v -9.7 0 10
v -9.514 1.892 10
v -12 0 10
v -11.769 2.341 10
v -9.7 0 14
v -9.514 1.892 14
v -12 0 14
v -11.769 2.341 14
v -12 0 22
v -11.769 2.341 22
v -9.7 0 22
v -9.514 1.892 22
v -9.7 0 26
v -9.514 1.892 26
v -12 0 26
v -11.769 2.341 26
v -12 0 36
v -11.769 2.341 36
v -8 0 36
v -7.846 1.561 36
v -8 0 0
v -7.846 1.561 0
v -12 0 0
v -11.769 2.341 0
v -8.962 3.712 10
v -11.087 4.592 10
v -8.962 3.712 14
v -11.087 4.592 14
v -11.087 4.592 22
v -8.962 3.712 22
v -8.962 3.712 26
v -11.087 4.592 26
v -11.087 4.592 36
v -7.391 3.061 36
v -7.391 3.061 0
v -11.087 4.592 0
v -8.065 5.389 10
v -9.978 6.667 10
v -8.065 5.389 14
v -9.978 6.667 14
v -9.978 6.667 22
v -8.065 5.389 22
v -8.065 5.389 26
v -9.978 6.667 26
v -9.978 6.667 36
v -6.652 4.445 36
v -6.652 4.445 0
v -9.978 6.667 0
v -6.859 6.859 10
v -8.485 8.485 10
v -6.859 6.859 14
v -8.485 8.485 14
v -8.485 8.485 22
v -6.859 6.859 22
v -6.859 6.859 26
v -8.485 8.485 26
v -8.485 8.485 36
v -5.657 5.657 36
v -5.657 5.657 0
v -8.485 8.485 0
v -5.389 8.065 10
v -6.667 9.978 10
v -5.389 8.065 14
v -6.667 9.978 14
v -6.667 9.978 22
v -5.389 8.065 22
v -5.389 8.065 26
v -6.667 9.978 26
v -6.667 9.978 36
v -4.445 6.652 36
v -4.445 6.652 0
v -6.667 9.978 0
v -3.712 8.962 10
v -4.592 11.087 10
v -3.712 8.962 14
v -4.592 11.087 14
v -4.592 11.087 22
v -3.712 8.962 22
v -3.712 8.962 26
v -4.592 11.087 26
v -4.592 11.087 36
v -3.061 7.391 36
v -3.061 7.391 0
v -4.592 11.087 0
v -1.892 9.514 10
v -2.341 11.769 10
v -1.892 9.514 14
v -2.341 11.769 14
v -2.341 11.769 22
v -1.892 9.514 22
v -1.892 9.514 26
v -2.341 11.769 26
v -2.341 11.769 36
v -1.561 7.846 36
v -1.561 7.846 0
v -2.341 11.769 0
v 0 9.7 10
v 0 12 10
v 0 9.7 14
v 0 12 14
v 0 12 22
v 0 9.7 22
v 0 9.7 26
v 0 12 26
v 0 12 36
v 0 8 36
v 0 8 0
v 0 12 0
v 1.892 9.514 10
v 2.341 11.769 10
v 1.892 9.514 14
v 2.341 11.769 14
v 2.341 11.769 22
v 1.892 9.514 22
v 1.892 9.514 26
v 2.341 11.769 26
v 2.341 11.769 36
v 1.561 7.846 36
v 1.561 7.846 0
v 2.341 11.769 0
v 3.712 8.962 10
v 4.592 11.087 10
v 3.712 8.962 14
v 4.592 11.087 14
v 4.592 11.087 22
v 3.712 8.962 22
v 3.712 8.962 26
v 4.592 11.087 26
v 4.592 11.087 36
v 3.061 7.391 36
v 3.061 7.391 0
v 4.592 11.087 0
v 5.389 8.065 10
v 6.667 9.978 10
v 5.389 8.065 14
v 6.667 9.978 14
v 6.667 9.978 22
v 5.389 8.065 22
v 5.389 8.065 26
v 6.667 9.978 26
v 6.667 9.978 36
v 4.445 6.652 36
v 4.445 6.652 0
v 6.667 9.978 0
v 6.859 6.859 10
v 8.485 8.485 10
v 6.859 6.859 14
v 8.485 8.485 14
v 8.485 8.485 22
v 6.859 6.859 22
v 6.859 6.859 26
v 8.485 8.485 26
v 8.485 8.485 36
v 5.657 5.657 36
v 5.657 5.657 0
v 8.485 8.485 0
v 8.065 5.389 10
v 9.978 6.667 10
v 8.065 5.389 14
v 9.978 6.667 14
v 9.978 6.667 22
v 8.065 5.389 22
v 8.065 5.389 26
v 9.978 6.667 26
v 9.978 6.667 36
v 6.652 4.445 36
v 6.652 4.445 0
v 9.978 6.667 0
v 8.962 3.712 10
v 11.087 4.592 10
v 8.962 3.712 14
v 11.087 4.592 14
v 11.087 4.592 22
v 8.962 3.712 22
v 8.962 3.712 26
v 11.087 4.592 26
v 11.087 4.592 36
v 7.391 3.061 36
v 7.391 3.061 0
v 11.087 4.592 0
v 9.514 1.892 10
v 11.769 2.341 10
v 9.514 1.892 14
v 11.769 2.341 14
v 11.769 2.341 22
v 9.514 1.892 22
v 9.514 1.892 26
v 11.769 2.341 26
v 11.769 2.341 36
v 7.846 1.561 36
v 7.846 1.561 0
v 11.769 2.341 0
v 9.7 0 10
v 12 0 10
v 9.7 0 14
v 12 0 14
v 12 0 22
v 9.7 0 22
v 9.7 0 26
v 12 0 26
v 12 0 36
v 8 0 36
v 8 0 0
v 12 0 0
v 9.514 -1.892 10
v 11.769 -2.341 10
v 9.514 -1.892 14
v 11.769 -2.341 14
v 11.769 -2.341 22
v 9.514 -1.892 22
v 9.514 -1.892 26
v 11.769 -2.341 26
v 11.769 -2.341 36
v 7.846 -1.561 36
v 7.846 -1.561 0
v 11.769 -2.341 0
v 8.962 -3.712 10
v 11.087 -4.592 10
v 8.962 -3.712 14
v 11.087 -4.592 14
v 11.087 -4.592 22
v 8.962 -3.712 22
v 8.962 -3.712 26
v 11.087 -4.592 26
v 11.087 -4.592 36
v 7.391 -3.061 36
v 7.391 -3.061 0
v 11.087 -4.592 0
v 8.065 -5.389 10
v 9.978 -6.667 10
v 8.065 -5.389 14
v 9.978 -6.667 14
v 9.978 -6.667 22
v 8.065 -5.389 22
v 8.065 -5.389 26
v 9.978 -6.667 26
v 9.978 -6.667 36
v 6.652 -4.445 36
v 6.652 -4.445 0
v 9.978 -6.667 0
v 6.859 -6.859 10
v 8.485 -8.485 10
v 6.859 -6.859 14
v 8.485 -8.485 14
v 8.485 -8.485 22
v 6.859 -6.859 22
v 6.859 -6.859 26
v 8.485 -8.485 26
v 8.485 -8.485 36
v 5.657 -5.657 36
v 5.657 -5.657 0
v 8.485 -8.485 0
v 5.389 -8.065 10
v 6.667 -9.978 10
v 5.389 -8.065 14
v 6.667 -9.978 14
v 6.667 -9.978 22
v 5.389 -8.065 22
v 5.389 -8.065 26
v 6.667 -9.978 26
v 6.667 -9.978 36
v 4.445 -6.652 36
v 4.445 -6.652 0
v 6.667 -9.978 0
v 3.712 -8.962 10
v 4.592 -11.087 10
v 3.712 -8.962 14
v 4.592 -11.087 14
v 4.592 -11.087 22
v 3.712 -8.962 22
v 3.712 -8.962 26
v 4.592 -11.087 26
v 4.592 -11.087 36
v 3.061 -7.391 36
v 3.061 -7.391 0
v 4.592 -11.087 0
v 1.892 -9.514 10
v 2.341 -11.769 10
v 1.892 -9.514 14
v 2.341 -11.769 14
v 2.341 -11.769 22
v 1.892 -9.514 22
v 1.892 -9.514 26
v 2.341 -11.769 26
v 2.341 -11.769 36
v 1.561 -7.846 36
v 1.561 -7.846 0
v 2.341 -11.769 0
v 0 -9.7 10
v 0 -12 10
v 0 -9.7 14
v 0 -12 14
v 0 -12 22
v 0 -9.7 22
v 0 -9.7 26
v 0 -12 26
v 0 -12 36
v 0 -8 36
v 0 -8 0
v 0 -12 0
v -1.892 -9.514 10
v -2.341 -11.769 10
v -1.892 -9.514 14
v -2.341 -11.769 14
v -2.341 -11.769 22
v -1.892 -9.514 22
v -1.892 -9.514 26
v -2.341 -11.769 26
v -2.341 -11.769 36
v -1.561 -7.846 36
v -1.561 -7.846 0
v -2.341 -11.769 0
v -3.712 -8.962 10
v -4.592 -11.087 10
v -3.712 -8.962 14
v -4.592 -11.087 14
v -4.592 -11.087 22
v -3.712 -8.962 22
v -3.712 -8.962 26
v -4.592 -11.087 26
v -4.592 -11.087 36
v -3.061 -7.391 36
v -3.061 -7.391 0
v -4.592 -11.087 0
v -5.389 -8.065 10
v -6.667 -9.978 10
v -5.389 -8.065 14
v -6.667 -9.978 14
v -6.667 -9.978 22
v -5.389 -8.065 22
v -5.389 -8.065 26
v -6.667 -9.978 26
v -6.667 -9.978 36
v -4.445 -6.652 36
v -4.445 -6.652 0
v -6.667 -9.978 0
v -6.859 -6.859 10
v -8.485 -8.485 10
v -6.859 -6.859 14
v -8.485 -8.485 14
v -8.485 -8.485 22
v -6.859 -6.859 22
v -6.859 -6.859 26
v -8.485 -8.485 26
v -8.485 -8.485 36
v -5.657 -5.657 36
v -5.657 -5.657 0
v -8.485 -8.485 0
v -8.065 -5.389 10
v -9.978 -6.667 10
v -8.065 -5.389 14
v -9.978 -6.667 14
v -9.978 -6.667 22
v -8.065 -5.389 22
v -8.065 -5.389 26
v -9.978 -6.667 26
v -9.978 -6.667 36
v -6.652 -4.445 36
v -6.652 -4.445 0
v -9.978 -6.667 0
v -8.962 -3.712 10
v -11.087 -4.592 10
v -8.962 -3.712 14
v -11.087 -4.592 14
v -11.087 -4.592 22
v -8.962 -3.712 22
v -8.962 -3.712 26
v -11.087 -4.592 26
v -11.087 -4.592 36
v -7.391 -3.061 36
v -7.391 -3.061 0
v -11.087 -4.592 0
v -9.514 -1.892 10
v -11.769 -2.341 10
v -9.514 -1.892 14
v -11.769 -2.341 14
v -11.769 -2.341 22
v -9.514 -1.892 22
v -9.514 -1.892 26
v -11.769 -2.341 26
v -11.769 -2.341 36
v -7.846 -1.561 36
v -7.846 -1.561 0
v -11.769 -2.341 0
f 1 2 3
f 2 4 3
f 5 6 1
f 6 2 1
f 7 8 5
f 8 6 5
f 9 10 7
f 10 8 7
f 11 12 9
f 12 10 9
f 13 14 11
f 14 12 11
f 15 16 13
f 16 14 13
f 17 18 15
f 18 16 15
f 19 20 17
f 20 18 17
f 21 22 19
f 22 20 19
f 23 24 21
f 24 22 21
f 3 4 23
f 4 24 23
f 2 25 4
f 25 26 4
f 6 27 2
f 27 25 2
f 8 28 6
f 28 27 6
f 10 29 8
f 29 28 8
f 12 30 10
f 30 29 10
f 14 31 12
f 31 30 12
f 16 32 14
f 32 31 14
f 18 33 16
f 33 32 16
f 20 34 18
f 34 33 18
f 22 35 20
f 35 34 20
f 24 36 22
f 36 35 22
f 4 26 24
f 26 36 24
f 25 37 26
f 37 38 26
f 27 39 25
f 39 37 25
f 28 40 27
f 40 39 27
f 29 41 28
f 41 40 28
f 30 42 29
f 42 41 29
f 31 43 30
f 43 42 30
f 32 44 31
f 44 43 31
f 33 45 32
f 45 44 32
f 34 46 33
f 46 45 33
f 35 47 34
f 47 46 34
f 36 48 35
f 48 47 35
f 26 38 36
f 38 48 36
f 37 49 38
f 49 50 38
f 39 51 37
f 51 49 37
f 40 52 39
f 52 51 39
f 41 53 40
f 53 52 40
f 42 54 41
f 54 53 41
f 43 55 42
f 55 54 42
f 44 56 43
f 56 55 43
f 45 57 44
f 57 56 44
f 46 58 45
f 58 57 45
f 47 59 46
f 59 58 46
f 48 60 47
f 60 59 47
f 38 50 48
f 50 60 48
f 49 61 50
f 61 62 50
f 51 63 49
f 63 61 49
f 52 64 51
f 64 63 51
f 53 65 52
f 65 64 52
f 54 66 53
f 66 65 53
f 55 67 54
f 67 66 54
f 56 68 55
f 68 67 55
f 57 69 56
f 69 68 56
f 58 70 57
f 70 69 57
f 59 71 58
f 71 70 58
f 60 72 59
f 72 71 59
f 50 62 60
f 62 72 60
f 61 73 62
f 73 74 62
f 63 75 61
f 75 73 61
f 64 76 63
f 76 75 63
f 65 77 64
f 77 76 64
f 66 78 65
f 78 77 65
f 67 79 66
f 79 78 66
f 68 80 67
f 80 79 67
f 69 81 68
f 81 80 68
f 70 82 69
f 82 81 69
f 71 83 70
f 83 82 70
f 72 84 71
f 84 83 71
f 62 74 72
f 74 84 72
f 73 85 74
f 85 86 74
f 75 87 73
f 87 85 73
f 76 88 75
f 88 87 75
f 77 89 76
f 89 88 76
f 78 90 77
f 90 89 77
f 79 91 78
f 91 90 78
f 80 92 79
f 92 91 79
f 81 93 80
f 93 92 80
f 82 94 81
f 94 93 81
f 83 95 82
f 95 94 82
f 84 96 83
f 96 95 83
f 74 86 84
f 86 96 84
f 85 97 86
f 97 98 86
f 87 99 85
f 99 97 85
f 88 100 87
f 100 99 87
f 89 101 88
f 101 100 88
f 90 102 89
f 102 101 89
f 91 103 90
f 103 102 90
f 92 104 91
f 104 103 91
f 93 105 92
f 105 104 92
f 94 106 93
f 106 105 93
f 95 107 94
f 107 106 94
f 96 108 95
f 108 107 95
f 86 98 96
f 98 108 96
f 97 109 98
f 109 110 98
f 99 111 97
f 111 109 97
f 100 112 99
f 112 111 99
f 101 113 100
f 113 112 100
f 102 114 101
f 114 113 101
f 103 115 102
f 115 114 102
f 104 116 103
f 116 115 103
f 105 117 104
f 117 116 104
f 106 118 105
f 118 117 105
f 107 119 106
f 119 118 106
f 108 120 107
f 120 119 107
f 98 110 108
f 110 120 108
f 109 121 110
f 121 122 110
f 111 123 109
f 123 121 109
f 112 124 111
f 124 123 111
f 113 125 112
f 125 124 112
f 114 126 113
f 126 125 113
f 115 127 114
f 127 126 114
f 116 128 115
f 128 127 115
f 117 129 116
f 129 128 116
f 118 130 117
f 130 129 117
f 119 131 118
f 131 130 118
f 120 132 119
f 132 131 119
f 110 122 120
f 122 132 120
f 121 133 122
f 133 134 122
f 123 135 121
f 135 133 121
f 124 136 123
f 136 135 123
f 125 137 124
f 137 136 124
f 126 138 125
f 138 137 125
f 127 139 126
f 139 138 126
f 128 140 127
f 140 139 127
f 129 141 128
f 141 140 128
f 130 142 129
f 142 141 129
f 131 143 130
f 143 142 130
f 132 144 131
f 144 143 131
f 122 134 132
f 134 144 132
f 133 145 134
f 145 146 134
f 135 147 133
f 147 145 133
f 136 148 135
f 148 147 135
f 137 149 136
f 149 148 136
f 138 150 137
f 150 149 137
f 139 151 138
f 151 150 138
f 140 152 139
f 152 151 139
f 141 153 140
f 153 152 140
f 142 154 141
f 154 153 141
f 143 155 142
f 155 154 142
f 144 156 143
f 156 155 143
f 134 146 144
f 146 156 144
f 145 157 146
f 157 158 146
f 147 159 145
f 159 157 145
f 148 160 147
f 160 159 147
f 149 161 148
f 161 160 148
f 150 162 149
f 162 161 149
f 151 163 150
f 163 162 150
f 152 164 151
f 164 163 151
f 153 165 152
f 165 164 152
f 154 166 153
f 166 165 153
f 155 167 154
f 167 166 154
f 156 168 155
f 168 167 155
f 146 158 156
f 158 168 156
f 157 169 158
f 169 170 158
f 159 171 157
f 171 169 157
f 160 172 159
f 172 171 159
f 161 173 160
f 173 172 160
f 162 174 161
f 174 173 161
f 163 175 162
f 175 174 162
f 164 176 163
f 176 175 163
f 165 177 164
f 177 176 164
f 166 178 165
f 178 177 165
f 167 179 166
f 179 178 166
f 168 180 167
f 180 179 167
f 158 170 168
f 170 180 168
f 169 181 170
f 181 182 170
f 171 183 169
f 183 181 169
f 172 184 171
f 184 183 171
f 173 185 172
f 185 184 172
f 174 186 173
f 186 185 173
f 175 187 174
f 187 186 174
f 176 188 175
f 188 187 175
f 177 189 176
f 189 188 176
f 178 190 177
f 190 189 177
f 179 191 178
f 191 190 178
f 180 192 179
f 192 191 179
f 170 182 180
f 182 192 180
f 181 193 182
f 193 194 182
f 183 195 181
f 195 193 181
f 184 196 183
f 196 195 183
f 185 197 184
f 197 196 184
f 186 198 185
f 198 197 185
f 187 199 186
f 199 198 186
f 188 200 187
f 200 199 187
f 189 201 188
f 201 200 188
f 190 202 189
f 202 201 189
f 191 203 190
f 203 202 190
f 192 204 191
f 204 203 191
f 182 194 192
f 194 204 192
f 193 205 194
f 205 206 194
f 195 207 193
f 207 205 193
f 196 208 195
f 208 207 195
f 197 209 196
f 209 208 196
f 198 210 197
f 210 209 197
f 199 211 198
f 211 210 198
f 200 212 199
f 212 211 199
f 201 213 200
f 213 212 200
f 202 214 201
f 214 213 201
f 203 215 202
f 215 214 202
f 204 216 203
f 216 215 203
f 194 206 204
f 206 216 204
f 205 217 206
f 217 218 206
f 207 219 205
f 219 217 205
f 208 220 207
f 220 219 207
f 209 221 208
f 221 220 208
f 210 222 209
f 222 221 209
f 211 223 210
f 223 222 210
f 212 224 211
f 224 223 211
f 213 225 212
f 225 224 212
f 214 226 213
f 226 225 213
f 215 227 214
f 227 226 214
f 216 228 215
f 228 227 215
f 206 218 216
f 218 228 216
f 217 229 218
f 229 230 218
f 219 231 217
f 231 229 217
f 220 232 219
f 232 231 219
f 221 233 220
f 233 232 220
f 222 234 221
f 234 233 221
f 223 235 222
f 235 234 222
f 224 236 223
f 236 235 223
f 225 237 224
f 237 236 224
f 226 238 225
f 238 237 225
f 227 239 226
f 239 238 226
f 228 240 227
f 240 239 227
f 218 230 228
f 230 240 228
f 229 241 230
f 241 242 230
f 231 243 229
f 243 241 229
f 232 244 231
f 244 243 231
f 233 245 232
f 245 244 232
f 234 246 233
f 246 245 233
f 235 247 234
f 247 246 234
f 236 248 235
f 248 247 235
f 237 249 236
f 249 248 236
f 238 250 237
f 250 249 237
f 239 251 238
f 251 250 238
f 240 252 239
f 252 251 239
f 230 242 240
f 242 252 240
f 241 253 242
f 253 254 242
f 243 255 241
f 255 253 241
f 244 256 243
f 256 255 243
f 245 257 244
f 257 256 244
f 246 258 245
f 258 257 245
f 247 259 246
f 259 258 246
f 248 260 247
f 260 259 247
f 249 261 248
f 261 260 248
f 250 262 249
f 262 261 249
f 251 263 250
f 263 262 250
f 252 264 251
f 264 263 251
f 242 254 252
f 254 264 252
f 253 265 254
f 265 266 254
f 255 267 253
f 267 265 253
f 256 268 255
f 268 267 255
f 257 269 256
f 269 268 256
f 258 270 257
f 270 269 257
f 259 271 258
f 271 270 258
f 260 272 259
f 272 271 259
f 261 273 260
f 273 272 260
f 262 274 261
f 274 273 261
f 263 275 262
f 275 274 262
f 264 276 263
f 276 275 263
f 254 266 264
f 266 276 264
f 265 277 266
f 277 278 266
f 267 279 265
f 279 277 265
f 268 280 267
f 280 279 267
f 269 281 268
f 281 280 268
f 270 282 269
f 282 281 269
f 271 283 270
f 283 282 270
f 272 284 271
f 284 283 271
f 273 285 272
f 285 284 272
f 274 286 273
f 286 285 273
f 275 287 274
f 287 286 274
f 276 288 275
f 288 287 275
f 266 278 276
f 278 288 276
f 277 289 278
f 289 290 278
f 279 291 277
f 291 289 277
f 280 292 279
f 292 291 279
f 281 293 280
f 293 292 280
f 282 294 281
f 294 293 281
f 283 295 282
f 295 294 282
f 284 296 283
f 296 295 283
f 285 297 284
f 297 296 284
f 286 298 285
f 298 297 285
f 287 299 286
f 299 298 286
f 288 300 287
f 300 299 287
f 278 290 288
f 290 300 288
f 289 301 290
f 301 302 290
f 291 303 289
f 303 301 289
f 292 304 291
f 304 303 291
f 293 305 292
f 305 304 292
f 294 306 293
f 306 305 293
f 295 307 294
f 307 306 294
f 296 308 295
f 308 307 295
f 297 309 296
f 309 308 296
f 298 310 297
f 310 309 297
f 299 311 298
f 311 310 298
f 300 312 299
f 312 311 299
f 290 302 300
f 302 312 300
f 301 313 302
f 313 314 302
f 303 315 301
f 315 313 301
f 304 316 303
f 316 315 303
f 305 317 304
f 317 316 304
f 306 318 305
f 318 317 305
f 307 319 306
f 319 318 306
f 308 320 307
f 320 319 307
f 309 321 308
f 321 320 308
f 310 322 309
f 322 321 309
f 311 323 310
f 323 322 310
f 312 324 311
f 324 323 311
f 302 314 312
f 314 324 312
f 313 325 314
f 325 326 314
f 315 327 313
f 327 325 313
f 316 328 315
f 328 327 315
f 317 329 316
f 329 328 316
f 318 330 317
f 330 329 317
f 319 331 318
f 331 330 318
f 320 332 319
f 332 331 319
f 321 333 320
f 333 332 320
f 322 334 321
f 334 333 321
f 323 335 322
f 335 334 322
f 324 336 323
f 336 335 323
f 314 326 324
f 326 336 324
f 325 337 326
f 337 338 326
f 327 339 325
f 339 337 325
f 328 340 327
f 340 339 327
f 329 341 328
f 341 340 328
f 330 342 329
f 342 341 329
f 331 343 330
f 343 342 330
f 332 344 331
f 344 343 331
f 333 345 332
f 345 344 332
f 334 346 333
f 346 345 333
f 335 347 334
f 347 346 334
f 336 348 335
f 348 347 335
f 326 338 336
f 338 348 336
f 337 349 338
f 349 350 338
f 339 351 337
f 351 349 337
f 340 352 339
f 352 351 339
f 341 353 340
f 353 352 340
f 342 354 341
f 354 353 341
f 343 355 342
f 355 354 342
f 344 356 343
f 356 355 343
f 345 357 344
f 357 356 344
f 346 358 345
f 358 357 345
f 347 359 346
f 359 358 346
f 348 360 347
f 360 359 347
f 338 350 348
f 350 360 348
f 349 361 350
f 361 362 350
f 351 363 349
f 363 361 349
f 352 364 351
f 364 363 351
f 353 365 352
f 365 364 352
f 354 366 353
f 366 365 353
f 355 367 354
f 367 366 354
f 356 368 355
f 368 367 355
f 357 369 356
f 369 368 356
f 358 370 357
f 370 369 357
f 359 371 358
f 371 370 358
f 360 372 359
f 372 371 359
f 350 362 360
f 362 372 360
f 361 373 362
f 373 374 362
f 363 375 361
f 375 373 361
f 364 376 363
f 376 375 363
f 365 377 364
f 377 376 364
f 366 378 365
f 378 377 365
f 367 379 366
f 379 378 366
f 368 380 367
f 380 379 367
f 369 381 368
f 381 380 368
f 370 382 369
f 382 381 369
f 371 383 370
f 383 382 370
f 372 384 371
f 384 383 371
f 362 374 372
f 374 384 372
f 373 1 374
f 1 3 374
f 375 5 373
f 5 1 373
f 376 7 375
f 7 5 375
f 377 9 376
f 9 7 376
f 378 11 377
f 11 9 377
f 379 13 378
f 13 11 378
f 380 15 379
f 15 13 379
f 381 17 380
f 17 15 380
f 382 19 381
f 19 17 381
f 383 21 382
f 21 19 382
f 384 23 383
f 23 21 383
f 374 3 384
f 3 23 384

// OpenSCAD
$fn = 32;

// ----------------------------------------------------------------------
// Grooved revolve: stepped, bore R8
// ----------------------------------------------------------------------

// --- parameters (mm) ---
bore_r = 8;               // bore radius
outer_r = 12;             // outer radius of the body
total_h = 36;             // overall height, Z
wall = 4;                 // radial wall thickness
groove_w = 4;             // groove width
groove_d = 2.3;           // groove depth
grooves = 2;              // number of outer grooves

bbox_x = 2 * outer_r;  // full diameter
bore_d = 2 * bore_r;  // bore diameter
body_d = 2 * outer_r;  // body diameter
revolve_angle = 360;  // full turn around the Z axis

profile = [[8, 0], [12, 0], [12, 10], [9.7, 10], [9.7, 14], [12, 14], [12, 22], [9.7, 22], [9.7, 26], [12, 26], [12, 36], [8, 36]];  // primary outline, 12 points, counter clockwise

// --- the one profile operation ---
rotate_extrude(angle = revolve_angle) polygon(points = profile);
